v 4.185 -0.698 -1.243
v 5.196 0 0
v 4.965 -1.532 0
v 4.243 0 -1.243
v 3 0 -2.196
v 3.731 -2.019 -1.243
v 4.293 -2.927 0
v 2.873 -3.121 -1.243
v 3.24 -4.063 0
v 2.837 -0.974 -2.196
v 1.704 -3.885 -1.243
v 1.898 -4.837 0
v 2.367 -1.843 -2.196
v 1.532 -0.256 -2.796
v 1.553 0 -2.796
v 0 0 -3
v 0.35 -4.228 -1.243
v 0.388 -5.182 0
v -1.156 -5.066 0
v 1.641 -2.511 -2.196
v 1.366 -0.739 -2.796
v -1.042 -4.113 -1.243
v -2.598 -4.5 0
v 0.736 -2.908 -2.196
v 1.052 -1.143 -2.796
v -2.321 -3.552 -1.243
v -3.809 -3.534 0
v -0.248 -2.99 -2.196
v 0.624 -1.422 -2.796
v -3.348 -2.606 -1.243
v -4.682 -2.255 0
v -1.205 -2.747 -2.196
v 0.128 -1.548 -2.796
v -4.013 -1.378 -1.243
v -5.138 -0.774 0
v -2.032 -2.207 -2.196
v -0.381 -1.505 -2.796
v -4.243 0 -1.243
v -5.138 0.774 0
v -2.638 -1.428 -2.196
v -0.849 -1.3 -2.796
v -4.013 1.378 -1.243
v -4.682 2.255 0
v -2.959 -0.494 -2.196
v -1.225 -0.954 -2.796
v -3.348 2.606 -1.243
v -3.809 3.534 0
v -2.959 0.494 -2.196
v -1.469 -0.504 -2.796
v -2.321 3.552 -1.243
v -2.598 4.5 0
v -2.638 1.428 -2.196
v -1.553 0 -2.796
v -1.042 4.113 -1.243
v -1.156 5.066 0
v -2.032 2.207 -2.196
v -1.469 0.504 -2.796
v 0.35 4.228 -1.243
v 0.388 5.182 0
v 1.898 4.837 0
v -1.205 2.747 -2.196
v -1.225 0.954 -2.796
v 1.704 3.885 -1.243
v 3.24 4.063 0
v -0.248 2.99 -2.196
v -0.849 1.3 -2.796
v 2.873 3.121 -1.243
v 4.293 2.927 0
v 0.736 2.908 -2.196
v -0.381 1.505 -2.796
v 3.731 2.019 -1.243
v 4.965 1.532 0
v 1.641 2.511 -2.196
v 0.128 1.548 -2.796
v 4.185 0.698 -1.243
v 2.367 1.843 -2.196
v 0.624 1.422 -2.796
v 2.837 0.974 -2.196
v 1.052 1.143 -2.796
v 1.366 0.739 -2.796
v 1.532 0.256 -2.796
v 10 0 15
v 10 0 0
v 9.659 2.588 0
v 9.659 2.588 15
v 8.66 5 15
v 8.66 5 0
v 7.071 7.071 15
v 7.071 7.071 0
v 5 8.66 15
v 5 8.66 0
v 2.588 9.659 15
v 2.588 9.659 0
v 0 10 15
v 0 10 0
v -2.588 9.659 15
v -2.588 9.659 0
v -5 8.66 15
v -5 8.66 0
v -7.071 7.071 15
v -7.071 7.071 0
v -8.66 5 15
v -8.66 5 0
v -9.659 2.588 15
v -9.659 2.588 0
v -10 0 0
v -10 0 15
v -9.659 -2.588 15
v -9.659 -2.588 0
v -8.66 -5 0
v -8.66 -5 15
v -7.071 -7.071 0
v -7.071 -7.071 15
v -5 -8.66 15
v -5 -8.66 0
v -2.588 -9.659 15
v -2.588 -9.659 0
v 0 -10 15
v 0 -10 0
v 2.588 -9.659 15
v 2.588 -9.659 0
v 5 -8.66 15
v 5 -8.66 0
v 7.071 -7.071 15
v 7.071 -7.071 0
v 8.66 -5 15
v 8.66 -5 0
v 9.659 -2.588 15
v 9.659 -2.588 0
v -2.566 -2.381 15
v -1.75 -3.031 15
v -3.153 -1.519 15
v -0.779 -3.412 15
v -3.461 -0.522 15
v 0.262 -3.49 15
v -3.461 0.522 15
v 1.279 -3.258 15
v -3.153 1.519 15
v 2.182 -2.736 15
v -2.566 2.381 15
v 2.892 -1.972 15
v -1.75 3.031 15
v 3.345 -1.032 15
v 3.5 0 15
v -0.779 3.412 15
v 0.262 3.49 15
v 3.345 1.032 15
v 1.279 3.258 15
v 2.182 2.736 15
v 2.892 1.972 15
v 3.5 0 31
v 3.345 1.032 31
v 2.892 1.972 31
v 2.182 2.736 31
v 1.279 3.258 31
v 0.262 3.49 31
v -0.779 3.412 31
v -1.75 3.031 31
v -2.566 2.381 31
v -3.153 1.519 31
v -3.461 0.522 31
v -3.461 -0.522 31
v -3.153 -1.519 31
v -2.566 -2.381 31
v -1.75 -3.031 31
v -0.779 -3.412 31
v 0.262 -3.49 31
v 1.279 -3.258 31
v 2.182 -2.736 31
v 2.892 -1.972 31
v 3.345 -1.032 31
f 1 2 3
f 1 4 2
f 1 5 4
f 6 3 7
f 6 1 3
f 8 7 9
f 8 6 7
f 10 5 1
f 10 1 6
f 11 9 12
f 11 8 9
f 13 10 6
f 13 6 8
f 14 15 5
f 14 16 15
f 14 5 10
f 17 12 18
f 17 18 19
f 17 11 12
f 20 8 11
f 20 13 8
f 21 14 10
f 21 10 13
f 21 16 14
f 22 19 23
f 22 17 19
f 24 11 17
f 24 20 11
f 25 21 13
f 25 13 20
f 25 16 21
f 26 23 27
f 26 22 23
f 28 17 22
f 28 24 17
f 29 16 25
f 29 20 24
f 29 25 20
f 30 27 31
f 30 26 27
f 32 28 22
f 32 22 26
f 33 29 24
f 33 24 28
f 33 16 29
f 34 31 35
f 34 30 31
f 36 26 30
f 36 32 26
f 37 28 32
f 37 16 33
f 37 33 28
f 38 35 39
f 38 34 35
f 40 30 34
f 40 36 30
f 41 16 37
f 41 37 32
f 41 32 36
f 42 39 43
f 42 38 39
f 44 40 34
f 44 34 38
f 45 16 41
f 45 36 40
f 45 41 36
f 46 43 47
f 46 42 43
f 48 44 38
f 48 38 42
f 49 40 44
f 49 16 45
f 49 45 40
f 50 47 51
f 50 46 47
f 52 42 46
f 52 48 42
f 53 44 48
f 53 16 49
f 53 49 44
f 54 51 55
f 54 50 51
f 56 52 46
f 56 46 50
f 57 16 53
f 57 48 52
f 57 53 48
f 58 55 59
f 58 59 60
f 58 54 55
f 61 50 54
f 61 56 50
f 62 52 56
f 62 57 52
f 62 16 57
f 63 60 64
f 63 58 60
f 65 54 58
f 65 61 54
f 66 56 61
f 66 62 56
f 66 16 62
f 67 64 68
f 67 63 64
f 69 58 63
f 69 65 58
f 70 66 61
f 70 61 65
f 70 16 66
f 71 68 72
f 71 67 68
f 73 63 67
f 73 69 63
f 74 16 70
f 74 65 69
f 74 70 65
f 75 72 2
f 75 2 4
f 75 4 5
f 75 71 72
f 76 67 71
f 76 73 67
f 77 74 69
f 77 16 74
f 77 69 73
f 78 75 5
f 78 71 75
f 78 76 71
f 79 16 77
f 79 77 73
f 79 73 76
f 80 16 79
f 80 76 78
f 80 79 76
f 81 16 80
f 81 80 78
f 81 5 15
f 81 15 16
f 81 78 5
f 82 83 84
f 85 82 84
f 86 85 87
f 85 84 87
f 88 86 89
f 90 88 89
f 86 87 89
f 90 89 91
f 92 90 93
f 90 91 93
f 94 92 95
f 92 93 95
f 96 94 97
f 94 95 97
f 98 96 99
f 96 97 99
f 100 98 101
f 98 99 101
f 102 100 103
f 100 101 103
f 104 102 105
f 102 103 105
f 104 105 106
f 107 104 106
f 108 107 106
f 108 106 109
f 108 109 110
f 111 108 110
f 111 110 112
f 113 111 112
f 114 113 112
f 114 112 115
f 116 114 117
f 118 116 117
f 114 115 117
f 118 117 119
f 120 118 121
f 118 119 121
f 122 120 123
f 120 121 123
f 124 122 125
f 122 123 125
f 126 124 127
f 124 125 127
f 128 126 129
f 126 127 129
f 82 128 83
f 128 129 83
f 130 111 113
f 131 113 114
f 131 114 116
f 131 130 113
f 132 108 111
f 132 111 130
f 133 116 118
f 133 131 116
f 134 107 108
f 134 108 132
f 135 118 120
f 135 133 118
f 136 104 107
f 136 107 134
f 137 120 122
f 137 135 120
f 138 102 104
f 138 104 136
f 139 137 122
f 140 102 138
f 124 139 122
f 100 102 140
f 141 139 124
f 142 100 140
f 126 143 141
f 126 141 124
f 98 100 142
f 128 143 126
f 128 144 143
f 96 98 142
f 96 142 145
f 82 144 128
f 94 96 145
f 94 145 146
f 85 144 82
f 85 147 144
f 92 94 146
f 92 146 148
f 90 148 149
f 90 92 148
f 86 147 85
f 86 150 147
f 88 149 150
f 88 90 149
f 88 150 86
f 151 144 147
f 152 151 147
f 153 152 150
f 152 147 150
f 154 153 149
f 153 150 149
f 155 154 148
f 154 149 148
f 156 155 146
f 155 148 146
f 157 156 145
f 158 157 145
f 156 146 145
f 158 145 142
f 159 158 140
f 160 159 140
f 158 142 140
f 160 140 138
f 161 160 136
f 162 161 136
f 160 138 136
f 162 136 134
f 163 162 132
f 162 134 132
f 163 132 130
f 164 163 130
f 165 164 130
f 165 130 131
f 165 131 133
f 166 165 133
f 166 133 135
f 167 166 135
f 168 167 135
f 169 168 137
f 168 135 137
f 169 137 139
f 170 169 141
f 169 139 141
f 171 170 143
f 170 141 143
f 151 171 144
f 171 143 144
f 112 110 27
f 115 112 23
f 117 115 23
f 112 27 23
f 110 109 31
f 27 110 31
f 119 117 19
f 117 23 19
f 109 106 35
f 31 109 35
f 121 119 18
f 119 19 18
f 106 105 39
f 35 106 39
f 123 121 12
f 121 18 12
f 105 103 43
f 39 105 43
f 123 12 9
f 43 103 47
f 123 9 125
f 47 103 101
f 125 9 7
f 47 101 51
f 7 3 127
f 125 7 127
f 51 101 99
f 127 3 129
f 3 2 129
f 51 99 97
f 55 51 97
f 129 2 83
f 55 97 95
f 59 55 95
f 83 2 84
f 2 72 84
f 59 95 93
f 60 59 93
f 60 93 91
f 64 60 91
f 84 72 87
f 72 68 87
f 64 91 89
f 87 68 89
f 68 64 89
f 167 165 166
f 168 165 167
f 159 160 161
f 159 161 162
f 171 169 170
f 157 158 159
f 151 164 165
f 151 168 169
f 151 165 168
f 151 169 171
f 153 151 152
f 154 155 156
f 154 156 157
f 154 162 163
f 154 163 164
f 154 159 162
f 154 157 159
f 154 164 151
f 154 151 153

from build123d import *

# Parameters (mm, degrees)
ESQUISSE1_R        = 10
BOSS_EXTRU_1_DEPTH = 15
ESQUISSE2_R        = 3.5
BOSS_EXTRU_2_DEPTH = 16


with BuildPart() as part:
    # Esquisse1 → Boss.-Extru.1 (new body)
    with BuildSketch(Plane.XY):
        Circle(ESQUISSE1_R)
    extrude(amount=BOSS_EXTRU_1_DEPTH)

    # Esquisse2 → Boss.-Extru.2 (add)
    with BuildSketch(Plane.XY.offset(15)):
        Circle(ESQUISSE2_R)
    extrude(amount=BOSS_EXTRU_2_DEPTH)

    # Esquisse3 → Révolution1 (revolve)
    with BuildSketch(Plane(origin=(0, 0, 0), x_dir=(1, 0, 0), z_dir=(0, 1, 0))):
        with BuildLine():
            Line((0, 3), (0, -9))
            ThreePointArc((0, -9), (6, -3), (0, 3))
        make_face()
    revolve(axis=Axis((0, 0, 34.789870501), (0, 0, -1)))


solid = part.part
